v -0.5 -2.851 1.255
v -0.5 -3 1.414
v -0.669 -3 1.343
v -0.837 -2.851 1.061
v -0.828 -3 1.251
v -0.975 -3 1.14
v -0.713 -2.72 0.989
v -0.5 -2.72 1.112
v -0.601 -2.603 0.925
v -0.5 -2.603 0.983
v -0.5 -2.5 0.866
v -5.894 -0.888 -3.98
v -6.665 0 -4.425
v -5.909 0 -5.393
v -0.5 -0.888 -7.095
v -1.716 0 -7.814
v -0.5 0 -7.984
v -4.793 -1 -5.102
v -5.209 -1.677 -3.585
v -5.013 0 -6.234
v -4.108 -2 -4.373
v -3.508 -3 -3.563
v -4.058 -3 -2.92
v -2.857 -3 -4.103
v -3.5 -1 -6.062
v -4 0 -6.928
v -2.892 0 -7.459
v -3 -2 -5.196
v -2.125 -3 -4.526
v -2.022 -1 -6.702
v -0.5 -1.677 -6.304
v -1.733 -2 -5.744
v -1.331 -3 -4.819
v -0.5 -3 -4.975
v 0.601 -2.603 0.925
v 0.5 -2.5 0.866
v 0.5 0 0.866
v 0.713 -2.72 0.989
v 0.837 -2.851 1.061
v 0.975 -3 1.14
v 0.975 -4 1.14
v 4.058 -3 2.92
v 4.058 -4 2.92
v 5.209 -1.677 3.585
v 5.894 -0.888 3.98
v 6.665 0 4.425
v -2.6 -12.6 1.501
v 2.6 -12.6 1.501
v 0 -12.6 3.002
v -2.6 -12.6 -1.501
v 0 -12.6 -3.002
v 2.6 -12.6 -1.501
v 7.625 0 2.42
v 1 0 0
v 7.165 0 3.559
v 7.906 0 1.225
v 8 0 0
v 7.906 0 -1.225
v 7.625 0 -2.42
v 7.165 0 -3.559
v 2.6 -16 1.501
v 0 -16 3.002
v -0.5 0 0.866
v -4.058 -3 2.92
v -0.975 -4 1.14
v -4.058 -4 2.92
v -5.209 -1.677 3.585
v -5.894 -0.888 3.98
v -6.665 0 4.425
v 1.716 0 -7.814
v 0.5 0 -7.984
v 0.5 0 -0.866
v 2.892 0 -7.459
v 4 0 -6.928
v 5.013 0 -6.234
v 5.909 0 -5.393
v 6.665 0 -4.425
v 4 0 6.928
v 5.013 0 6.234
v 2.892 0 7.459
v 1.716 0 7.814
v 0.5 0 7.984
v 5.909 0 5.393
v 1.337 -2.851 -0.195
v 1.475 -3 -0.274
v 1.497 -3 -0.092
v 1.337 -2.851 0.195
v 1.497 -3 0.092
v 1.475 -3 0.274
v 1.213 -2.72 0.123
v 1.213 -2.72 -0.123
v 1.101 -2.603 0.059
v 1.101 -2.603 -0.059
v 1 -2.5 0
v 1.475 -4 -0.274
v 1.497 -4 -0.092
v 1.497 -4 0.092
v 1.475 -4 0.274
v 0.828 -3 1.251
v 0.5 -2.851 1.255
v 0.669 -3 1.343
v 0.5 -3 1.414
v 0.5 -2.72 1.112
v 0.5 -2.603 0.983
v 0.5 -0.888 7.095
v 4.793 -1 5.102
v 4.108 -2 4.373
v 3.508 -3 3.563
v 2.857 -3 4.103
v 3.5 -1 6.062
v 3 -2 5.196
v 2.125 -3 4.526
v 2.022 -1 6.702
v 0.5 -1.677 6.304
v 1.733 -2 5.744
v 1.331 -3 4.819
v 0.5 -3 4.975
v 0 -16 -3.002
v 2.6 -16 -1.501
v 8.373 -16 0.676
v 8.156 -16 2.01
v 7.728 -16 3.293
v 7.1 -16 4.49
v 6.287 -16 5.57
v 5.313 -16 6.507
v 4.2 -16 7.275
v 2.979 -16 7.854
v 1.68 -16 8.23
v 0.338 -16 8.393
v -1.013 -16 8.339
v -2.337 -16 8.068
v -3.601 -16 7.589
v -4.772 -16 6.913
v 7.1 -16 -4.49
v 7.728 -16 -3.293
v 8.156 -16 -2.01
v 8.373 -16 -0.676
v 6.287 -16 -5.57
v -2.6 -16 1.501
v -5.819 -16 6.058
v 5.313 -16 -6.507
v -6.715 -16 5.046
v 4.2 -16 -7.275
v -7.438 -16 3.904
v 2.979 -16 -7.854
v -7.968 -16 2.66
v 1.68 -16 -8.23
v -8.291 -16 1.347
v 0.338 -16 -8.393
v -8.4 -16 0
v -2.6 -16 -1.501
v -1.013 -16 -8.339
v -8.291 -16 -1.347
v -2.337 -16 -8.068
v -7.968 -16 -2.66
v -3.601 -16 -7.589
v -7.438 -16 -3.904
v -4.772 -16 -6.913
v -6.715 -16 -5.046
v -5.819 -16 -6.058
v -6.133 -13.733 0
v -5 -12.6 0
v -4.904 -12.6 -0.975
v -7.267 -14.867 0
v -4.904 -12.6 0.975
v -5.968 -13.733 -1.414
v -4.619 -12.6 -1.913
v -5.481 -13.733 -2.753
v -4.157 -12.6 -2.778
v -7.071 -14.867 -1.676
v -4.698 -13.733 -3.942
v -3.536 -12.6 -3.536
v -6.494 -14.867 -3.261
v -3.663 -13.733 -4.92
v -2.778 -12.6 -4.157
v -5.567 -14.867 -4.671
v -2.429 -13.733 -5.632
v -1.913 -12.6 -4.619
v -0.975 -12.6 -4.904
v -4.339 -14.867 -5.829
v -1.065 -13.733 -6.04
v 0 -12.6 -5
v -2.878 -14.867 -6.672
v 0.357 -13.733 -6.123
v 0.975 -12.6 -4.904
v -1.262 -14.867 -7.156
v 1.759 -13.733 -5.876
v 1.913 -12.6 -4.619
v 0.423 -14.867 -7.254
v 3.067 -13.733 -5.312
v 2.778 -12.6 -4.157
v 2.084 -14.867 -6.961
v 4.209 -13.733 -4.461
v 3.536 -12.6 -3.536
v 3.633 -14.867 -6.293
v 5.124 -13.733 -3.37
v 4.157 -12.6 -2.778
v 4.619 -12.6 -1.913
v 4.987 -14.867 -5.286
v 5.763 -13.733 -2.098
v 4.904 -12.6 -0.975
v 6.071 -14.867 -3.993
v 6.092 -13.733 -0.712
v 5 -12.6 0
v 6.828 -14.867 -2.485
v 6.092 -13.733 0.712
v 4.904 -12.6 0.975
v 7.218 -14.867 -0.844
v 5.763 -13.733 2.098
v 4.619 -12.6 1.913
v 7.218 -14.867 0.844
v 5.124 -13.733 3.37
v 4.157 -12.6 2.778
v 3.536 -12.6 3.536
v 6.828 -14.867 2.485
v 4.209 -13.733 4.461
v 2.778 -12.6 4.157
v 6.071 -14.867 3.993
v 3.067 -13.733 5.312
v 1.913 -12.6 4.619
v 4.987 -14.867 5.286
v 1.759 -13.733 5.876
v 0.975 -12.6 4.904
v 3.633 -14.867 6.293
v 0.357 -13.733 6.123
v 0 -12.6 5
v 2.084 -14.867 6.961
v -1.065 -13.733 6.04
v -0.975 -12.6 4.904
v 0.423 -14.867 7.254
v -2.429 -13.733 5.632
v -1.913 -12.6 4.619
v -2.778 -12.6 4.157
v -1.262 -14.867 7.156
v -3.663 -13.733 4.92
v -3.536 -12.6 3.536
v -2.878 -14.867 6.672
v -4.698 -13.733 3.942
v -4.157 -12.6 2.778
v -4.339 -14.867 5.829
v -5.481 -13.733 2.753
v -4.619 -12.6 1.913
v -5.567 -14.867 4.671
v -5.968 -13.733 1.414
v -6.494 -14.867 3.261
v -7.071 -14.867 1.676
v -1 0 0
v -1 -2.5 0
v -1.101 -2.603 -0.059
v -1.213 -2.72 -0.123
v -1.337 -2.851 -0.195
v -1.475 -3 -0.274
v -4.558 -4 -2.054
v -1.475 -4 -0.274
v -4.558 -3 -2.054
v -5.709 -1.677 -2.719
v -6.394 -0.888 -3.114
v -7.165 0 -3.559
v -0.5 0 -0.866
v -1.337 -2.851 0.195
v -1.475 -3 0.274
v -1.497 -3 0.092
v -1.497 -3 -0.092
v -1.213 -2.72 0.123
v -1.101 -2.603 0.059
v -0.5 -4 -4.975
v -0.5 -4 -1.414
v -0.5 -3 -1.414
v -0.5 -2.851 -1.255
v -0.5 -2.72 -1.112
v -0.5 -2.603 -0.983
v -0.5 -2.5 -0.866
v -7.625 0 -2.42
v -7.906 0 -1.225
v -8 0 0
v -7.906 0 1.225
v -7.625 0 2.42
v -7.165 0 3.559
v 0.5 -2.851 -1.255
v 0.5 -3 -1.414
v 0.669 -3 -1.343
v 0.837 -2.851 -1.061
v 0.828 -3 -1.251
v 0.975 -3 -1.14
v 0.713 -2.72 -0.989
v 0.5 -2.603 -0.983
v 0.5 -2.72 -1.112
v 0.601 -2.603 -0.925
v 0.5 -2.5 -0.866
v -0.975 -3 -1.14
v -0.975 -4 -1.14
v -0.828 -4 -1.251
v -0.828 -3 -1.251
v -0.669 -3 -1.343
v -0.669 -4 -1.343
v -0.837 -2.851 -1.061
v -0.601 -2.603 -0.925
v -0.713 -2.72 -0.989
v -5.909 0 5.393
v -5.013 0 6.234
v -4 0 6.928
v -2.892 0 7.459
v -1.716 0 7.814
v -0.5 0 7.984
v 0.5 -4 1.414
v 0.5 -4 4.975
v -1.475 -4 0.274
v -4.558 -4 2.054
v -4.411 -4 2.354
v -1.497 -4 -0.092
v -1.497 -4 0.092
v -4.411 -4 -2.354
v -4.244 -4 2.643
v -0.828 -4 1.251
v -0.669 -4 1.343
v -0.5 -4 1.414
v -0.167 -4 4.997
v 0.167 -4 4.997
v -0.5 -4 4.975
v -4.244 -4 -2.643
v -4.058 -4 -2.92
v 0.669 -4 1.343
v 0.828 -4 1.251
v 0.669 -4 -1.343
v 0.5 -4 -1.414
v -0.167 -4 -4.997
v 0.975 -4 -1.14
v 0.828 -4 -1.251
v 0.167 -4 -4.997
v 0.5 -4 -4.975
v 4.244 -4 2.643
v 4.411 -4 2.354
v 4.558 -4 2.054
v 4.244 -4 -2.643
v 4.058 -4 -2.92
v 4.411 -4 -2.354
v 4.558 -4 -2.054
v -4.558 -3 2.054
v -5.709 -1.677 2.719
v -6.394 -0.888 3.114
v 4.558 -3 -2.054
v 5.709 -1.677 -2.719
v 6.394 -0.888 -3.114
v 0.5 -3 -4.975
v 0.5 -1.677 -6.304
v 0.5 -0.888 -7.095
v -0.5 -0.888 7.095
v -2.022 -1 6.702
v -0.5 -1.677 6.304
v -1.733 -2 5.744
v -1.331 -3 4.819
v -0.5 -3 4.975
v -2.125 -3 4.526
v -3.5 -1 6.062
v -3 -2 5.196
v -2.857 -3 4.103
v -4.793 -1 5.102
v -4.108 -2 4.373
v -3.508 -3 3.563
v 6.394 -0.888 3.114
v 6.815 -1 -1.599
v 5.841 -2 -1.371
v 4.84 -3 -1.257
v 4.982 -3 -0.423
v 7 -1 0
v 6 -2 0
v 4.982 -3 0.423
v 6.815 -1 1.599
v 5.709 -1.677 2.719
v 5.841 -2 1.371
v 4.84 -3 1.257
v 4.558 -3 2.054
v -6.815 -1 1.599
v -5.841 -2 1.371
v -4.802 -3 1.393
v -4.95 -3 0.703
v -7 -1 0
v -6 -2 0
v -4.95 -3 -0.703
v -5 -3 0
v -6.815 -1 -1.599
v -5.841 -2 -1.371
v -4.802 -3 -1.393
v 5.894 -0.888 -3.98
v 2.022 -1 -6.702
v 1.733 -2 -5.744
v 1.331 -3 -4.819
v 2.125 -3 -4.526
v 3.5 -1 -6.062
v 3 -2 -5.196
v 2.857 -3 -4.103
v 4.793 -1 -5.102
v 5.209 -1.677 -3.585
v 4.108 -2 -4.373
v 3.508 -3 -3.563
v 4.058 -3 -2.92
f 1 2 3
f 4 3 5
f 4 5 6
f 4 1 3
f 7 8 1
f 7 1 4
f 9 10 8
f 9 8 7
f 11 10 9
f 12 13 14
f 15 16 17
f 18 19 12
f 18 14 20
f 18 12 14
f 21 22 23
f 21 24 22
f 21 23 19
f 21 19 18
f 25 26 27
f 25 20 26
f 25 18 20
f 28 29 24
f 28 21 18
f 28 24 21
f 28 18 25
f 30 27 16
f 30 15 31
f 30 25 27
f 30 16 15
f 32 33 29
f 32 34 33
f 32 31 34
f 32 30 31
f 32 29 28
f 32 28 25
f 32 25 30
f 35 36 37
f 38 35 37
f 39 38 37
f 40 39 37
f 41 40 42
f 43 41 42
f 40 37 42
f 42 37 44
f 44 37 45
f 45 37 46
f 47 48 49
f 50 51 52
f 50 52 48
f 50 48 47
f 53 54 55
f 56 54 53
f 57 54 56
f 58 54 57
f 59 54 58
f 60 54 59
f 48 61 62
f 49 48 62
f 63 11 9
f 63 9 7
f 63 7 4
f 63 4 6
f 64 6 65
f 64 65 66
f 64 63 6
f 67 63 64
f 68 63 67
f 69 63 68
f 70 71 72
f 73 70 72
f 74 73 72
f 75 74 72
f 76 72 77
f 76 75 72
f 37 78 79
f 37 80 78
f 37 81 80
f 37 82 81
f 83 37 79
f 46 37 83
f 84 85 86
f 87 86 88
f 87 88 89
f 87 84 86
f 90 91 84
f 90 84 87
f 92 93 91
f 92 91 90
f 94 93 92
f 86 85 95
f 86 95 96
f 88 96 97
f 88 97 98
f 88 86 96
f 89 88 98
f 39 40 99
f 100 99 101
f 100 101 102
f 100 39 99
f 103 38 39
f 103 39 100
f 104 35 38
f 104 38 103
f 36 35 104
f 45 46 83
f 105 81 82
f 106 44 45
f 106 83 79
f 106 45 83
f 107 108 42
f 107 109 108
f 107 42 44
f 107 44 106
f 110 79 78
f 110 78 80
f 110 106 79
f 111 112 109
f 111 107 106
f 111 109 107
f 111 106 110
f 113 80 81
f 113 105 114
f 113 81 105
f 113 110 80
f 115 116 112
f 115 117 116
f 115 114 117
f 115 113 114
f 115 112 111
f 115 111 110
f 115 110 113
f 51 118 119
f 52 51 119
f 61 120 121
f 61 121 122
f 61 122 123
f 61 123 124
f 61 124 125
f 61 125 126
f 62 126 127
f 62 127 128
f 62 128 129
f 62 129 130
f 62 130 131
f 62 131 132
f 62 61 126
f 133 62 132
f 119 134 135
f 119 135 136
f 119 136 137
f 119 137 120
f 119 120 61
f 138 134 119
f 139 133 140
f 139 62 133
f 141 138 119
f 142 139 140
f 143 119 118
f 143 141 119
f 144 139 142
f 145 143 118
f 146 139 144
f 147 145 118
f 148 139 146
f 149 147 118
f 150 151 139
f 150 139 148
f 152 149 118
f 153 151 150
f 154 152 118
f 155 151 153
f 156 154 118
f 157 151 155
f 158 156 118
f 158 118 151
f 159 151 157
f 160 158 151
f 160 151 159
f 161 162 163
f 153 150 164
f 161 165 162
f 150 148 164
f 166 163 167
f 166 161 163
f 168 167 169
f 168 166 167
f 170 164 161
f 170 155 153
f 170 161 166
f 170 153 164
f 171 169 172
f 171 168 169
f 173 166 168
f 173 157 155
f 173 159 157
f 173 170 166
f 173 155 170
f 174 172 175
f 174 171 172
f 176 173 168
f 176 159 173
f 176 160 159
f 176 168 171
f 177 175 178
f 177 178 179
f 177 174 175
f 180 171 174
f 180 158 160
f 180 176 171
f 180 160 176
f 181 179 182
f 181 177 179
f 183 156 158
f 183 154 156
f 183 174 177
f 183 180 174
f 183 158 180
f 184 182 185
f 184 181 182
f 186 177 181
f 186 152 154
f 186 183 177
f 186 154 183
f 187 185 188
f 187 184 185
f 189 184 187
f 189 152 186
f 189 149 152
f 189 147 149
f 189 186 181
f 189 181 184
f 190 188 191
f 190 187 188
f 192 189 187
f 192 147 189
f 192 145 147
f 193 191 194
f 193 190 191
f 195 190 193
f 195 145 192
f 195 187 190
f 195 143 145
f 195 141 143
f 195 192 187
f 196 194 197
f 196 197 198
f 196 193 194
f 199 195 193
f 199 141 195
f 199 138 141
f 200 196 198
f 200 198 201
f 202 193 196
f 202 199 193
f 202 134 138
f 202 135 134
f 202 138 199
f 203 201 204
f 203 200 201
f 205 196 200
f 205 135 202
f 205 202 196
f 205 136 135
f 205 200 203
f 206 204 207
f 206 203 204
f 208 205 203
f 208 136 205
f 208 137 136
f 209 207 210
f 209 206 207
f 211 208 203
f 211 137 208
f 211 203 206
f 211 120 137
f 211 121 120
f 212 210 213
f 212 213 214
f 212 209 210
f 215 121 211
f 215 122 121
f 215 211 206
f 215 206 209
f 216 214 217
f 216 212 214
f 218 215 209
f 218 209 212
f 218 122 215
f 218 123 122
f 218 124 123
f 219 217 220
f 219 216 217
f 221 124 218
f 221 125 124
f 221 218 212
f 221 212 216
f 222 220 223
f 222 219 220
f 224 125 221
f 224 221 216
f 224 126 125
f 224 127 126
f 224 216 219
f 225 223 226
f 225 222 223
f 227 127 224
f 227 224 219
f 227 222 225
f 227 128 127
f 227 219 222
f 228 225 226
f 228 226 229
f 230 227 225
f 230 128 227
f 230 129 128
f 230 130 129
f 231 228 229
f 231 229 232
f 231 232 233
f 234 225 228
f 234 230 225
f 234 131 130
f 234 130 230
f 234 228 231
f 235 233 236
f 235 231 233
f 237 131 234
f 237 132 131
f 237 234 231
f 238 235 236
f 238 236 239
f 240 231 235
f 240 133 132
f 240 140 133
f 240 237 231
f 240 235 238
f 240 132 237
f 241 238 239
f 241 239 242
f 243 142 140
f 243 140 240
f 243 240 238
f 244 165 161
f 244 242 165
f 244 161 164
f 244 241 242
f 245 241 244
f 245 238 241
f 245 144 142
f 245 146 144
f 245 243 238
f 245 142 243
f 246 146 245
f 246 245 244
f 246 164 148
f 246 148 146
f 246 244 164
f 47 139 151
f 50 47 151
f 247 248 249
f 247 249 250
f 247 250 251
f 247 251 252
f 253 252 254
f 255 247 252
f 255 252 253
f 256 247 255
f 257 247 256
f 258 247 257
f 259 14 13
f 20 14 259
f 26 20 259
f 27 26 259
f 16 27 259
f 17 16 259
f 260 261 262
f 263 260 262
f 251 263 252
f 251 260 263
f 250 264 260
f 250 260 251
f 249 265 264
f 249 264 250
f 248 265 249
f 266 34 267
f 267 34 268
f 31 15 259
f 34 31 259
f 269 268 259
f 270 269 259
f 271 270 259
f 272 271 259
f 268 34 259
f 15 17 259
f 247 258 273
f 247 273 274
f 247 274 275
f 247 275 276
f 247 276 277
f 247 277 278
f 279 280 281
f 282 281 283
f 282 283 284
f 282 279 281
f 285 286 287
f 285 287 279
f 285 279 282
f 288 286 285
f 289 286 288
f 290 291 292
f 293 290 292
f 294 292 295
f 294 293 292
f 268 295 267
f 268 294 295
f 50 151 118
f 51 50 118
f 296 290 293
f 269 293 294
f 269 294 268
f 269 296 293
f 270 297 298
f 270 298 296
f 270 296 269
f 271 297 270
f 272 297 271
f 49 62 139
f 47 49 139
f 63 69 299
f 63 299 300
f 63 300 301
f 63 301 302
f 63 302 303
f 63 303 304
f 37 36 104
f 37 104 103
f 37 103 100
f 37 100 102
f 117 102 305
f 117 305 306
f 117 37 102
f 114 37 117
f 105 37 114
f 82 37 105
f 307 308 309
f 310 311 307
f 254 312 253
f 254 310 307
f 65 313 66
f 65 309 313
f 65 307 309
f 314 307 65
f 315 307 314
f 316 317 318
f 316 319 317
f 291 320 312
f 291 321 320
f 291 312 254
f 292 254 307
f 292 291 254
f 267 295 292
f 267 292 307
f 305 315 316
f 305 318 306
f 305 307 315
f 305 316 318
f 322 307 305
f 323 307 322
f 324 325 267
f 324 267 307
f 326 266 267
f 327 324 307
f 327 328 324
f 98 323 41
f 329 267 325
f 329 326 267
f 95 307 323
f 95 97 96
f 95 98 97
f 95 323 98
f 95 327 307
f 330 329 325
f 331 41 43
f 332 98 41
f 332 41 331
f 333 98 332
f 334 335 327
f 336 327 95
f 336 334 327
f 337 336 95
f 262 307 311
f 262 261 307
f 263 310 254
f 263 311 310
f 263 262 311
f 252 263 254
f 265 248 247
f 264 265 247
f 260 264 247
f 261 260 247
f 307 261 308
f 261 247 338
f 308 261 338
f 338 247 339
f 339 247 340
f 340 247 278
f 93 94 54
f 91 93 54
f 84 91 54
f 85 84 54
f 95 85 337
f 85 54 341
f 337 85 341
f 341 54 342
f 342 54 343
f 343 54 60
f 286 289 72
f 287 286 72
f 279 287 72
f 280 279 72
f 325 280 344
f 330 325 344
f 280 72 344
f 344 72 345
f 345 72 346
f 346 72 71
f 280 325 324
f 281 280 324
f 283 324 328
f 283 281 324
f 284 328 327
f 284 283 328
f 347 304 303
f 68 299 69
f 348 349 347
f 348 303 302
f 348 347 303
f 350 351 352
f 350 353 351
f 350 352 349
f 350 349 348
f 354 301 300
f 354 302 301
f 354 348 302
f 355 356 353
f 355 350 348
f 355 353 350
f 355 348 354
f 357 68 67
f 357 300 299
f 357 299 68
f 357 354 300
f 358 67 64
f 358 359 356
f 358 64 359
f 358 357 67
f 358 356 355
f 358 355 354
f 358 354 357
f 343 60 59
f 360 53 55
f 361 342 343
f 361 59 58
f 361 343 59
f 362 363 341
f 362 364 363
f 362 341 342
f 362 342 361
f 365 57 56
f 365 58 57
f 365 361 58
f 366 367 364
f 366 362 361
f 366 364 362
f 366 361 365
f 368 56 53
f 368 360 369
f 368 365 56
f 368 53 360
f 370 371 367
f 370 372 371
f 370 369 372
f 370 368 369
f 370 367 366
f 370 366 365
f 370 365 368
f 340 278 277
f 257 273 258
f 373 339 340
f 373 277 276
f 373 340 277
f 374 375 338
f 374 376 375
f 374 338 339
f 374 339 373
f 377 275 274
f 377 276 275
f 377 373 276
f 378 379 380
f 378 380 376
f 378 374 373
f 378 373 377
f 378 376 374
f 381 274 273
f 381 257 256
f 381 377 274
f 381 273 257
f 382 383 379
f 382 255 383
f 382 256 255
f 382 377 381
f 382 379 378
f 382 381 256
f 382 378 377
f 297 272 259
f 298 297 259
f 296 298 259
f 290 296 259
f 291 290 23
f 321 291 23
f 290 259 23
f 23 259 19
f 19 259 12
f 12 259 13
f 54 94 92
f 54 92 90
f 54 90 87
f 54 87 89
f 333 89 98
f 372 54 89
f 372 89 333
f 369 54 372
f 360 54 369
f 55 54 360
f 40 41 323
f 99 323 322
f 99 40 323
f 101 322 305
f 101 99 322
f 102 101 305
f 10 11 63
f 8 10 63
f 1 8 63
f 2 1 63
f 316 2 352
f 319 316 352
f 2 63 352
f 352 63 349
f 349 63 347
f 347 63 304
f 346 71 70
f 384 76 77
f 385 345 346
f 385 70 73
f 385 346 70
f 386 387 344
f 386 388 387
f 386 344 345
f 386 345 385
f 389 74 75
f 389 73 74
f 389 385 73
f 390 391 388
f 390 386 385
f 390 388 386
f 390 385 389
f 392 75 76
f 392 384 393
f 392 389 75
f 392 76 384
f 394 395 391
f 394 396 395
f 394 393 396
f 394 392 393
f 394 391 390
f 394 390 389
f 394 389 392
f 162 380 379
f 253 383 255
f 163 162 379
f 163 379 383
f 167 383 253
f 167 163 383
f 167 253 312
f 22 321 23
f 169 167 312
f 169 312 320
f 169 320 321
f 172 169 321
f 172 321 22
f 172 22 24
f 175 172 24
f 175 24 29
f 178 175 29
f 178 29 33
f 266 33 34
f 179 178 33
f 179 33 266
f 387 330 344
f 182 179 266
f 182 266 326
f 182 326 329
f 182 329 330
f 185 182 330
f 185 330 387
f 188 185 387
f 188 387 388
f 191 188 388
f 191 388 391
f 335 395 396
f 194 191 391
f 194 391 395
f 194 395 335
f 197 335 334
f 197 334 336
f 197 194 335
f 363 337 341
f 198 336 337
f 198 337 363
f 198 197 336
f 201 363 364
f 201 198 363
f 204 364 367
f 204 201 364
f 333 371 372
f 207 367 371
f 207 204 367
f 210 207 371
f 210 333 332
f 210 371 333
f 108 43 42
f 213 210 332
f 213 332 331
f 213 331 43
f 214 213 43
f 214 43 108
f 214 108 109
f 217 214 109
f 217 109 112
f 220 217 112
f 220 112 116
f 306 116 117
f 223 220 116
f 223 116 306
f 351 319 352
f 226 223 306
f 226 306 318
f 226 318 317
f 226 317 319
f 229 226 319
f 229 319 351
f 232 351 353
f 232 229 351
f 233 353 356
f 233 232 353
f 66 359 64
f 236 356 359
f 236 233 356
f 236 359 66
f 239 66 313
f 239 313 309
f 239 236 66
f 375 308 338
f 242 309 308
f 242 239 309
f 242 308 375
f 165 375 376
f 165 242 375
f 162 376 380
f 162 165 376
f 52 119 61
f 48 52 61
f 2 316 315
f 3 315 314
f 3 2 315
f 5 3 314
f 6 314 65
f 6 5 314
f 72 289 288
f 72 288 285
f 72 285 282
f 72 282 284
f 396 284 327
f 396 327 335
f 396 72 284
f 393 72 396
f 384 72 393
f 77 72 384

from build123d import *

# Parameters (mm, degrees)
SKETCH_2_R               = 10
EXTRUDE_1_DEPTH          = 3.4
SKETCH_5_W               = 5
SKETCH_5_H               = 8.6
CUT_EXTRUDE_1_DEPTH      = 0.5
PATTERN_CIRCULAR_1_COUNT = 6


with BuildPart() as part:
    # 草图2 → 凸台-拉伸1 (new body)
    with BuildSketch(Plane(origin=(0, -16, 0), x_dir=(-1, 0, 0), z_dir=(0, -1, 0))):
        Circle(SKETCH_2_R)
        Polygon((0, 3.0022214), (-2.6, 1.5011107), (-2.6, -1.5011107), (0, -3.0022214), (2.6, -1.5011107), (2.6, 1.5011107), align=None, mode=Mode.SUBTRACT)
    extrude(amount=-EXTRUDE_1_DEPTH)

    # 草图5 → 旋转1 (revolve)
    with BuildSketch(Plane.XY):
        with Locations((-2.5, -8.3)):
            Rectangle(SKETCH_5_W, SKETCH_5_H)
    revolve(axis=Axis((0, 22.928075319, 0), (0, -1, 0)))

    # 草图6 → 切除-旋转1 (revolve, cut)
    with BuildSketch(Plane.XY):
        Polygon((-5, -12.6), (-10, -17.6), (-10, -12.6), align=None)
    revolve(axis=Axis((0, 0, 0), (0, -1, 0)), mode=Mode.SUBTRACT)

    # 草图7 → 旋转2 (revolve)
    with BuildSketch(Plane.XY):
        Polygon((-5, -4), (0, -4), (0, 0), (-8, 0), (-5, -3), align=None)
    revolve(axis=Axis((0, 2.901504441, 0), (0, -1, 0)))

    # 草图8 → 切除-拉伸1 (cut, symmetric)
    with BuildSketch(Plane(origin=(0, 0, 0), x_dir=(0, 0, -1), z_dir=(1, 0, 0))):
        Polygon((-5, -3), (-8, 0), (0, 0), (0, -4), (-5, -4), align=None)
    cut_extrude_1 = extrude(amount=CUT_EXTRUDE_1_DEPTH, both=True, mode=Mode.SUBTRACT)

    # 阵列(圆周)1: 切除-拉伸1 ×6 about axis
    pattern_circular_1_axis = Axis((0, 0, 0), (0, 1, 0))
    for i in range(1, PATTERN_CIRCULAR_1_COUNT):
        add(cut_extrude_1.rotate(pattern_circular_1_axis, i * 360 / PATTERN_CIRCULAR_1_COUNT), mode=Mode.SUBTRACT)

    # 草图9 → 切除-旋转3 (revolve, cut)
    with BuildSketch(Plane.XY):
        Polygon((0, -4), (-1.5, -4), (-1.5, -3), (0, -1.5), align=None)
    revolve(axis=Axis((0, 4.48946261, 0), (0, -1, 0)), mode=Mode.SUBTRACT)


solid = part.part
